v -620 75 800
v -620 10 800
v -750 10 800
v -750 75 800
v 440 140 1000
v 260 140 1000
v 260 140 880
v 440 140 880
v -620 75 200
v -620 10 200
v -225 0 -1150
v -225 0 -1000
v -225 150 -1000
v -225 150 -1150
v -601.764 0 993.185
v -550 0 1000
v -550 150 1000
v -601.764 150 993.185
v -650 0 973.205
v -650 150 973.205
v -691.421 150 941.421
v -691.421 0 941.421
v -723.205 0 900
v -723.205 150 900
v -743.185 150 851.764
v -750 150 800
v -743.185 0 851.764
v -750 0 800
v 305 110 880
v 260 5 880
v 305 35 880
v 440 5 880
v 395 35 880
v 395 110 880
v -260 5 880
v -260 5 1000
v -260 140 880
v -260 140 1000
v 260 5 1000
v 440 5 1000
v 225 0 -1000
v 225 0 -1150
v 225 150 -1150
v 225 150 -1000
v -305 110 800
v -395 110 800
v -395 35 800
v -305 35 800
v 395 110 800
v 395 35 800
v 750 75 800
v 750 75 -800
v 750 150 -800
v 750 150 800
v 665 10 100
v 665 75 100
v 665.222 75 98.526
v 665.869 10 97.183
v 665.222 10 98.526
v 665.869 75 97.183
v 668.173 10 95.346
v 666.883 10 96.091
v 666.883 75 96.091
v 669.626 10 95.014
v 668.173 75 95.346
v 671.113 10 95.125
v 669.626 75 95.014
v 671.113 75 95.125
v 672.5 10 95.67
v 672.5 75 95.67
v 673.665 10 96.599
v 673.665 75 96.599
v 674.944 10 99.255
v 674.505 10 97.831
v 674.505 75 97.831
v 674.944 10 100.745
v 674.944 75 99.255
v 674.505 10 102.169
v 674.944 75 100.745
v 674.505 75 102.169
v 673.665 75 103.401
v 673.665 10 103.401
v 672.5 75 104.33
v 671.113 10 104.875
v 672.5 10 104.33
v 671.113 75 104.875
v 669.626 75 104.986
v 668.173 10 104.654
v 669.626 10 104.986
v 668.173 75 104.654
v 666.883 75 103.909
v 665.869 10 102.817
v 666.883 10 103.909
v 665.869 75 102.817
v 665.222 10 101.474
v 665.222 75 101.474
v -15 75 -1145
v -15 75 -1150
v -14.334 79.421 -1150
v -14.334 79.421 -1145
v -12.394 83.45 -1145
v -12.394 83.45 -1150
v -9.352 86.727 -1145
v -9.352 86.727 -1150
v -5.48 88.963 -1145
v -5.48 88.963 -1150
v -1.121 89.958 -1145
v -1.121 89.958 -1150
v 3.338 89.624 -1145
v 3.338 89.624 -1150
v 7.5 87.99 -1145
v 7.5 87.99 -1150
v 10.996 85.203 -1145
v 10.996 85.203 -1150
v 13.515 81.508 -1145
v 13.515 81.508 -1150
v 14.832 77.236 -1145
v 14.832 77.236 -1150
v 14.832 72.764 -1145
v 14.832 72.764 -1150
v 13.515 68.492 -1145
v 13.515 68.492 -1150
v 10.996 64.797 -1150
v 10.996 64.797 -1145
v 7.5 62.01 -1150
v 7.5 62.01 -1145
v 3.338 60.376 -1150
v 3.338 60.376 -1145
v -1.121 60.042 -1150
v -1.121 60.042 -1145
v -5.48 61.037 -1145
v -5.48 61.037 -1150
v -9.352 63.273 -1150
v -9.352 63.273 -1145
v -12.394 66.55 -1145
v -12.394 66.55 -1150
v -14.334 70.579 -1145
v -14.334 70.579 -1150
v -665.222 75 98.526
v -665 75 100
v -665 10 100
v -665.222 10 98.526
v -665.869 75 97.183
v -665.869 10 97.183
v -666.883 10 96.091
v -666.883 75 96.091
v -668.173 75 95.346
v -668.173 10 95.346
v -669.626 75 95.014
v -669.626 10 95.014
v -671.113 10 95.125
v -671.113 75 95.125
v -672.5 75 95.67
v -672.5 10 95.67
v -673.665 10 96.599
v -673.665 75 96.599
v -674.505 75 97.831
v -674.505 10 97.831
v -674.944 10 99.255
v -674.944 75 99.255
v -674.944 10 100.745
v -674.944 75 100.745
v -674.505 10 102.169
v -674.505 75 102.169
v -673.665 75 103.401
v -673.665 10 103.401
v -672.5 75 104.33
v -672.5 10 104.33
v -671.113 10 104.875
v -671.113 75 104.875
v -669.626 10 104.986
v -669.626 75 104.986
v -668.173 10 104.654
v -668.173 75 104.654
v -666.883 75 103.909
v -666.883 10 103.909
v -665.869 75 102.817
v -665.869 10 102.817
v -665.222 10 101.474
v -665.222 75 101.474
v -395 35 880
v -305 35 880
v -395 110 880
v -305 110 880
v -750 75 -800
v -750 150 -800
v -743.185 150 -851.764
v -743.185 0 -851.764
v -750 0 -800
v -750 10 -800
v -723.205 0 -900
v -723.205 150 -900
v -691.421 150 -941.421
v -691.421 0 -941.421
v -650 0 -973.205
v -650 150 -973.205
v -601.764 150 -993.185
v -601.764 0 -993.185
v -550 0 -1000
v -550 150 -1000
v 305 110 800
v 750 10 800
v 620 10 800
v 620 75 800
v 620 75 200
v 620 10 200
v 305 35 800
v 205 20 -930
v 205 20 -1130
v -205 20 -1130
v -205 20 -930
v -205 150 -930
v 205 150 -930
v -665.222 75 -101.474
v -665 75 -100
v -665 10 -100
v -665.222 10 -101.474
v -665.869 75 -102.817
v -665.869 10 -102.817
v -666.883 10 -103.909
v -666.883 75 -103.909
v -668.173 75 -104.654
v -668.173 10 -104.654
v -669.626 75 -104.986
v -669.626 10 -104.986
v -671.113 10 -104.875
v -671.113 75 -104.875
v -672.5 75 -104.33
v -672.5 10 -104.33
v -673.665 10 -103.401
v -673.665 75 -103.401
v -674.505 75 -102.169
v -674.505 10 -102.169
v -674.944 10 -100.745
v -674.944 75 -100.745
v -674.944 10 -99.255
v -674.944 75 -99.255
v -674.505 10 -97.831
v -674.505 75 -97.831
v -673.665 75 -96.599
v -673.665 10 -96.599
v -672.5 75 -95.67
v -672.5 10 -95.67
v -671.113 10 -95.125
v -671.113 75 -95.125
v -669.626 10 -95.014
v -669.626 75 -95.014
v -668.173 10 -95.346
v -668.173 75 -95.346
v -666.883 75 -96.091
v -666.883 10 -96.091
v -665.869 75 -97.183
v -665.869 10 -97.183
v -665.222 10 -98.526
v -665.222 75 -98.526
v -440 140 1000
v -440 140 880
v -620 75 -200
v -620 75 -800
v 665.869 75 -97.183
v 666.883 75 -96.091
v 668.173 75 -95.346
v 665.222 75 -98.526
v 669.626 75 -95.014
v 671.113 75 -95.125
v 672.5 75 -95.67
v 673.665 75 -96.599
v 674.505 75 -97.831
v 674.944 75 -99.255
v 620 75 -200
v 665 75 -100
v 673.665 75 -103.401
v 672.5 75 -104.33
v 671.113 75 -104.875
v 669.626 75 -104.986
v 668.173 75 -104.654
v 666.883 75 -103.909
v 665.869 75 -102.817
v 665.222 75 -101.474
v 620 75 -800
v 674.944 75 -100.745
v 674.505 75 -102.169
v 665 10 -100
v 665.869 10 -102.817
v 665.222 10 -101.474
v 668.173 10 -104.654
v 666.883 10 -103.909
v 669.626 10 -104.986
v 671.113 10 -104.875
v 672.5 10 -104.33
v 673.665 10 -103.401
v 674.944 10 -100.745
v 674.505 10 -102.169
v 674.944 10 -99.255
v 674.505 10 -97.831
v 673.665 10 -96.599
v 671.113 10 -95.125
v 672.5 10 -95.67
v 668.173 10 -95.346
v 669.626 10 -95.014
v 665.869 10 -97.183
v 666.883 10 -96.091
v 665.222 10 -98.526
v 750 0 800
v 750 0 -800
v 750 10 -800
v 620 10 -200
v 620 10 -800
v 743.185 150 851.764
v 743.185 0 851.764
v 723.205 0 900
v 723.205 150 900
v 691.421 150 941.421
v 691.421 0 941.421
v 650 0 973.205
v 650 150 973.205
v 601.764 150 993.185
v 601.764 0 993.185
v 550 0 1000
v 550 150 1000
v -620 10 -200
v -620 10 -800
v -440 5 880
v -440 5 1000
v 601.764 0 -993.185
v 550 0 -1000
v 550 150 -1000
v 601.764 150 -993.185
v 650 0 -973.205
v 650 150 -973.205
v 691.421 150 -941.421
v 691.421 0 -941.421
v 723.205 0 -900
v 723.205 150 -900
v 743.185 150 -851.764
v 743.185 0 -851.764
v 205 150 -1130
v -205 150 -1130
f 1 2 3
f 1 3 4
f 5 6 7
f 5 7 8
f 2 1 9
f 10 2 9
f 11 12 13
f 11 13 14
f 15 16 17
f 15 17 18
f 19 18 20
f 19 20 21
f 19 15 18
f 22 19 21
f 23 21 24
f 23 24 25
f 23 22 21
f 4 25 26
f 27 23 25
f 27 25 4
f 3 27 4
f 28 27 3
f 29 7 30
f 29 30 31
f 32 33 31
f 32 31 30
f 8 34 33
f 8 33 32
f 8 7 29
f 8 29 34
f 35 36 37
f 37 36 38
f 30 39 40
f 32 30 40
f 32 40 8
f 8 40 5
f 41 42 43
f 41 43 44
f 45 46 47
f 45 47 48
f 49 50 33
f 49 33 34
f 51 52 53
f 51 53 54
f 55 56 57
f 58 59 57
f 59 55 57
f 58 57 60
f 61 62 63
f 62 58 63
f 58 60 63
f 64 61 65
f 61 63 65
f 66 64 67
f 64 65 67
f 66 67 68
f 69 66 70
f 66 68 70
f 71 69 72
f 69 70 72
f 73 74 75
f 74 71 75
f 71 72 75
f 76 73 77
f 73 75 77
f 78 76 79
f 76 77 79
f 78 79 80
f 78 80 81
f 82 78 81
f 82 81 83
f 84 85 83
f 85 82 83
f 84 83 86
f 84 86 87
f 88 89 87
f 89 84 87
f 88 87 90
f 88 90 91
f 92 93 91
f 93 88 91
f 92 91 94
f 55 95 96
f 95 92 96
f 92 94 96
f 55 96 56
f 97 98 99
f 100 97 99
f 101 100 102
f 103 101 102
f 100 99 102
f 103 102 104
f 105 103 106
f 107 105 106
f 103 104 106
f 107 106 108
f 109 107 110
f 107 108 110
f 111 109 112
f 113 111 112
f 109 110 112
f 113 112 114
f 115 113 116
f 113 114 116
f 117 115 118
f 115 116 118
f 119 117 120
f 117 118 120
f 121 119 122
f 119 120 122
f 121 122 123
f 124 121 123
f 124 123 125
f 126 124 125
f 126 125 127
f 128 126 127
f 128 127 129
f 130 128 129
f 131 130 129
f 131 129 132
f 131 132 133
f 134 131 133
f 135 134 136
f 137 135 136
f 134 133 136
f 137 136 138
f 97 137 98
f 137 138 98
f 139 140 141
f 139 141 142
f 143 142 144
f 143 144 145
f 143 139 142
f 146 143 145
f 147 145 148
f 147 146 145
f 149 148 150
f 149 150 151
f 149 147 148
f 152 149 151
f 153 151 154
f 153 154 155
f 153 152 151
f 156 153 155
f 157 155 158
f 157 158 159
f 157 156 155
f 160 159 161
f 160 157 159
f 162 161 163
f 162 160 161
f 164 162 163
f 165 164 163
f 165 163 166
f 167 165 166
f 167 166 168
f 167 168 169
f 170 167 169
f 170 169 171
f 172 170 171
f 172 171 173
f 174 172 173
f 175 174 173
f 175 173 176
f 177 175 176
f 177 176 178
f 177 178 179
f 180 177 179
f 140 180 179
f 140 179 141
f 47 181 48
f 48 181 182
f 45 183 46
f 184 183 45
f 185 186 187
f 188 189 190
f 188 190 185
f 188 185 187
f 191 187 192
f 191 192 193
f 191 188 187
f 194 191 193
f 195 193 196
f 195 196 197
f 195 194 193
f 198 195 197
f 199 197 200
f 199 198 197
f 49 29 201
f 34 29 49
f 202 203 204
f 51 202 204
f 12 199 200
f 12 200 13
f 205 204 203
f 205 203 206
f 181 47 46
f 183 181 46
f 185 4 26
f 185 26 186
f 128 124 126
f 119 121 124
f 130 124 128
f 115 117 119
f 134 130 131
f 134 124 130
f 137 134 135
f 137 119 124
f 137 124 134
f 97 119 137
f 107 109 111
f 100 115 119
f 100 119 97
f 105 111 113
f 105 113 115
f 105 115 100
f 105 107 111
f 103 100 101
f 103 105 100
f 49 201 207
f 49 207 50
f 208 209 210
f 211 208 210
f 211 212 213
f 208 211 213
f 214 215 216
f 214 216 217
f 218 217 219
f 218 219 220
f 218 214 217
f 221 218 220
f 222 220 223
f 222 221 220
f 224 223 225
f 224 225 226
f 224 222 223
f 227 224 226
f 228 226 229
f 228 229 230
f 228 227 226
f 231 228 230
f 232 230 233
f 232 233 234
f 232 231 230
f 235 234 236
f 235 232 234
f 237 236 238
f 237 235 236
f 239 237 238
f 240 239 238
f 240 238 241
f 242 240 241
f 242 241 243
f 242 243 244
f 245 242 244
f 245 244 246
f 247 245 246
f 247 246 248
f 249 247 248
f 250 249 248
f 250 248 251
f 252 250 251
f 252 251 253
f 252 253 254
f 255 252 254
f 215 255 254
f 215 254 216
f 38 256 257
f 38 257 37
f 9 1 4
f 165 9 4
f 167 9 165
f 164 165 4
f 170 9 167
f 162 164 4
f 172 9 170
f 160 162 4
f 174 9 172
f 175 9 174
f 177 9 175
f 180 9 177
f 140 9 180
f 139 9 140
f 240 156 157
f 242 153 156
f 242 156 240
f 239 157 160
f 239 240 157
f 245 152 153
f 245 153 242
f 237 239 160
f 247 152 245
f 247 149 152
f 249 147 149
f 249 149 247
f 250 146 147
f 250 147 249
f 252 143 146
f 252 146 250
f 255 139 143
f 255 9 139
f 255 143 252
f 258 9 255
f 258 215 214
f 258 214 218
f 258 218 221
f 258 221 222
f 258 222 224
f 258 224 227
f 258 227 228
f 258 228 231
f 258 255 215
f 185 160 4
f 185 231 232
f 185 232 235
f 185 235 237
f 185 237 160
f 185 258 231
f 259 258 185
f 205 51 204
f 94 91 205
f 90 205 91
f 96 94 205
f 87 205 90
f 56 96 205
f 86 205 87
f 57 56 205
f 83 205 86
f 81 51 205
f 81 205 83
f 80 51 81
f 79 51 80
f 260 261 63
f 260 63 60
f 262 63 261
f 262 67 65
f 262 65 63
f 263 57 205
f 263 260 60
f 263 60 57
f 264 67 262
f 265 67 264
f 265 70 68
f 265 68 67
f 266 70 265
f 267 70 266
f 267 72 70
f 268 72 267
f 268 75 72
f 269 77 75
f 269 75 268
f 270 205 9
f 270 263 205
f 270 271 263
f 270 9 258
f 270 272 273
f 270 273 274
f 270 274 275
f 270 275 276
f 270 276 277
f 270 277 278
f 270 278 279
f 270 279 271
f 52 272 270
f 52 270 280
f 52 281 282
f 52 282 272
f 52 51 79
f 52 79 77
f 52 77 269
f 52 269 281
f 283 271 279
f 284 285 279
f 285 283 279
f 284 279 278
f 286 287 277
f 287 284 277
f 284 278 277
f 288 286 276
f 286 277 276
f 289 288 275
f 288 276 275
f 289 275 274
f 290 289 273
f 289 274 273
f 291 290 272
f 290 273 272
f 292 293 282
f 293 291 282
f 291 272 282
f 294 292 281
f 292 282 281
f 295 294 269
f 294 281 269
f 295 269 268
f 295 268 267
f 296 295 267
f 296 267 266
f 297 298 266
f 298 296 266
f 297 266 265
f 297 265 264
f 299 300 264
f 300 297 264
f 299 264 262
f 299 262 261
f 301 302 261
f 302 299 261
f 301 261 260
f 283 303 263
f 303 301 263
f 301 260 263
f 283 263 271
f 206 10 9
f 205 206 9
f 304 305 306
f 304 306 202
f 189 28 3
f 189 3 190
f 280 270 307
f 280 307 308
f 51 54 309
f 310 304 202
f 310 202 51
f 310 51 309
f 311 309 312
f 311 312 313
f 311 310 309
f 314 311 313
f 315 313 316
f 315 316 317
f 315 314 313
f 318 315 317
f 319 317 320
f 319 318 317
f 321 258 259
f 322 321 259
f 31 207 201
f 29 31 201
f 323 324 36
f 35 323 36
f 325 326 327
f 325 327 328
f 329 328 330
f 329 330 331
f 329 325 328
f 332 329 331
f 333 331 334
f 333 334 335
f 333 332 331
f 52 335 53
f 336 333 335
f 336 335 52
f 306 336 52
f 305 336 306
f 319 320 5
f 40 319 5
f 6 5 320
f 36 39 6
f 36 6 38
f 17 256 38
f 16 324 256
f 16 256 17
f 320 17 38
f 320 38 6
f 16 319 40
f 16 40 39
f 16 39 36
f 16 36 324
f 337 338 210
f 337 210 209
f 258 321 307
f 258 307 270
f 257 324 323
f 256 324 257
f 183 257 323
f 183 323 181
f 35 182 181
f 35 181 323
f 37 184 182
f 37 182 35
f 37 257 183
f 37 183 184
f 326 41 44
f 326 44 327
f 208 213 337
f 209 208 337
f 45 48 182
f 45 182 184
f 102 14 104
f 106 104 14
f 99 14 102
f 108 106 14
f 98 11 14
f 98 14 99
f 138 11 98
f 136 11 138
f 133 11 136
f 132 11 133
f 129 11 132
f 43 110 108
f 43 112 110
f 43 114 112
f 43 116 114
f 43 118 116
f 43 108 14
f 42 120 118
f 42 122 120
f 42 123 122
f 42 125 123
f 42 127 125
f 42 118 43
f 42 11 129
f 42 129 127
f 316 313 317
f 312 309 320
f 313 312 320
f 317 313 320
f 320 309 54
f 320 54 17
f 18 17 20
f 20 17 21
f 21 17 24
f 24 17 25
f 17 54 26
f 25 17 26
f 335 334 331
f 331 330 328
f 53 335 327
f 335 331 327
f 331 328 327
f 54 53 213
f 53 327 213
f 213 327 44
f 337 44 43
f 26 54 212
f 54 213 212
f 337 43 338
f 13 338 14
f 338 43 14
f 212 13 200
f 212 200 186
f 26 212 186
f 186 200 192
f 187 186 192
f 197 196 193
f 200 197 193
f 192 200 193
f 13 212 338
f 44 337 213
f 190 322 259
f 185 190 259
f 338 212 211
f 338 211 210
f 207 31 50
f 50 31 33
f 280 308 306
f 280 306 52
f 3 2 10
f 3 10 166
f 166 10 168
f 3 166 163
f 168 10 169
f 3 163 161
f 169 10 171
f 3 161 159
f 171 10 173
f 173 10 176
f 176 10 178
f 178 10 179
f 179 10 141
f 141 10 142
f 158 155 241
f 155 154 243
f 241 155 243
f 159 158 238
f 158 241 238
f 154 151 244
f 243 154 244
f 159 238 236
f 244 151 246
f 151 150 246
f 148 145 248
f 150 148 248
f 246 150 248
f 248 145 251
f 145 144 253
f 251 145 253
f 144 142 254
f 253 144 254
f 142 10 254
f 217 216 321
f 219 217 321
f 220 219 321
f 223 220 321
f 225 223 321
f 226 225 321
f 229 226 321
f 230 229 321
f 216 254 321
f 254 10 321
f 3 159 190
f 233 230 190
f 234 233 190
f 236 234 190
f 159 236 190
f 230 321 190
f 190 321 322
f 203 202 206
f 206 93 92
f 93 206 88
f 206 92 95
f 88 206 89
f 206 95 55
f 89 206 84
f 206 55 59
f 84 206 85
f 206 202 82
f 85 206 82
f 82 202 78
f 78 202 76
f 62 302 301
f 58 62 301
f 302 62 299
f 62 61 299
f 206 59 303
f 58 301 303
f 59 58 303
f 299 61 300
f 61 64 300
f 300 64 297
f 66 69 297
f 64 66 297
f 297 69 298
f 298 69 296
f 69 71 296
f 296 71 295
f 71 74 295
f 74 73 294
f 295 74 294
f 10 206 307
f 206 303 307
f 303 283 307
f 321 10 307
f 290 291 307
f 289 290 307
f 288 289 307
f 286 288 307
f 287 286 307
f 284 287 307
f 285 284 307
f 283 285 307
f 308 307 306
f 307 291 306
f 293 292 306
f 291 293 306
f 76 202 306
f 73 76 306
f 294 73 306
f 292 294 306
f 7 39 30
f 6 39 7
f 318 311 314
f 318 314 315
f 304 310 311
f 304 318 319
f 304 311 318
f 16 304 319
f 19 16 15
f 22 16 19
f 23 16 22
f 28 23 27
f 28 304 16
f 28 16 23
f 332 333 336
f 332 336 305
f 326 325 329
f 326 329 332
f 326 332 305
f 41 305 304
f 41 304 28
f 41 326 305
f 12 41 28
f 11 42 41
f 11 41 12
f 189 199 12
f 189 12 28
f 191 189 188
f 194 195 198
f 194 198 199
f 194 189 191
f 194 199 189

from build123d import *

# Parameters (mm, degrees)
BOSS_EXTRUDE1_DEPTH     = 150
SKETCH2_W               = 400
SKETCH2_H               = 65
CUT_EXTRUDE1_DEPTH      = 1
CUT_EXTRUDE1_DEPTH_BACK = 1501
SKETCH3_W               = 600
SKETCH3_H               = 65
CUT_EXTRUDE2_DEPTH      = 130
SKETCH4_R               = 5
BOSS_EXTRUDE2_DEPTH     = 150
SKETCH5_W               = 90
SKETCH5_H               = 75
CUT_EXTRUDE3_DEPTH      = 200
SKETCH6_R               = 15
CUT_EXTRUDE4_DEPTH      = 5
SKETCH7_W               = 180
SKETCH7_H               = 135
CUT_EXTRUDE5_DEPTH      = 120
CUT_EXTRUDE6_START      = -20
SKETCH8_W               = 410
SKETCH8_H               = 110
SKETCH8_R               = 15
CUT_EXTRUDE6_DEPTH      = 200
SKETCH9_W               = 410
SKETCH9_H               = 200
CUT_EXTRUDE7_DEPTH      = 127


with BuildPart() as part:
    # Sketch1 → Boss-Extrude1 (new body)
    with BuildSketch(Plane(origin=(0, 0, 0), x_dir=(1, 0, 0), z_dir=(0, 1, 0))):
        with BuildLine():
            Line((-225, 1000), (-225, 1150))
            Line((-225, 1150), (225, 1150))
            Line((225, 1150), (225, 1000))
            Line((225, 1000), (550, 1000))
            ThreePointArc((550, 1000), (691.421356237, 941.421356237), (750, 800))
            Line((750, 800), (750, -800))
            ThreePointArc((750, -800), (691.421356237, -941.421356237), (550, -1000))
            Line((550, -1000), (-550, -1000))
            ThreePointArc((-550, -1000), (-691.421356237, -941.421356237), (-750, -800))
            Line((-750, -800), (-750, 800))
            ThreePointArc((-750, 800), (-691.421356237, 941.421356237), (-550, 1000))
            Line((-550, 1000), (-225, 1000))
        make_face()
    extrude(amount=BOSS_EXTRUDE1_DEPTH)

    # Sketch2 → Cut-Extrude1 (cut, two sides)
    with BuildSketch(Plane(origin=(750, 0, 0), x_dir=(0, 0, -1), z_dir=(1, 0, 0))) as cut_extrude1_sk:
        with Locations((0, 42.5)):
            Rectangle(SKETCH2_W, SKETCH2_H)
    extrude(amount=CUT_EXTRUDE1_DEPTH, mode=Mode.SUBTRACT)
    extrude(cut_extrude1_sk.sketch, amount=-CUT_EXTRUDE1_DEPTH_BACK, mode=Mode.SUBTRACT)

    # Sketch3 → Cut-Extrude2 (cut)
    with BuildSketch(Plane(origin=(750, 0, 0), x_dir=(0, 0, -1), z_dir=(1, 0, 0))):
        with Locations((500, 42.5)):
            Rectangle(SKETCH3_W, SKETCH3_H)
        with Locations((-500, 42.5)):
            Rectangle(SKETCH3_W, SKETCH3_H)
    cut_extrude2 = extrude(amount=-CUT_EXTRUDE2_DEPTH, mode=Mode.SUBTRACT)

    # Mirror1: Cut-Extrude2 across plane
    add(cut_extrude2.mirror(Plane(origin=(0, 0, 0), x_dir=(0, 0, 1), z_dir=(1, 0, 0))), mode=Mode.SUBTRACT)

    # Sketch4 → Boss-Extrude2 (add)
    with BuildSketch(Plane(origin=(0, 150, 0), x_dir=(1, 0, 0), z_dir=(0, 1, 0))):
        with Locations((-670, 100)):
            Circle(SKETCH4_R)
        with Locations((-670, -100)):
            Circle(SKETCH4_R)
    boss_extrude2 = extrude(amount=-BOSS_EXTRUDE2_DEPTH)

    # Mirror2: Boss-Extrude2 across plane
    add(boss_extrude2.mirror(Plane(origin=(0, 0, 0), x_dir=(0, 0, 1), z_dir=(1, 0, 0))))

    # Sketch5 → Cut-Extrude3 (cut)
    with BuildSketch(Plane.XY.offset(1000)):
        with Locations((-350, 72.5)):
            Rectangle(SKETCH5_W, SKETCH5_H)
        with Locations((350, 72.5)):
            Rectangle(SKETCH5_W, SKETCH5_H)
    extrude(amount=-CUT_EXTRUDE3_DEPTH, mode=Mode.SUBTRACT)

    # Sketch6 → Cut-Extrude4 (cut)
    with BuildSketch(Plane(origin=(0, 0, -1150), x_dir=(-1, 0, 0), z_dir=(0, 0, -1))):
        with Locations((0, 75)):
            Circle(SKETCH6_R)
    extrude(amount=-CUT_EXTRUDE4_DEPTH, mode=Mode.SUBTRACT)

    # Sketch7 → Cut-Extrude5 (cut)
    with BuildSketch(Plane.XY.offset(1000)):
        with Locations((-350, 72.5)):
            Rectangle(SKETCH7_W, SKETCH7_H)
        with Locations((350, 72.5)):
            Rectangle(SKETCH7_W, SKETCH7_H)
    extrude(amount=-CUT_EXTRUDE5_DEPTH, mode=Mode.SUBTRACT)

    # Sketch8 → Cut-Extrude6 (cut)
    with BuildSketch(Plane(origin=(0, 0, -1150), x_dir=(-1, 0, 0), z_dir=(0, 0, -1)).offset(CUT_EXTRUDE6_START)):
        with Locations((0, 75)):
            Rectangle(SKETCH8_W, SKETCH8_H)
        with Locations((0, 75)):
            Circle(SKETCH8_R, mode=Mode.SUBTRACT)
    extrude(amount=-CUT_EXTRUDE6_DEPTH, mode=Mode.SUBTRACT)

    # Sketch9 → Cut-Extrude7 (cut)
    with BuildSketch(Plane(origin=(0, 150, 0), x_dir=(1, 0, 0), z_dir=(0, 1, 0))):
        with Locations((0, 1030)):
            Rectangle(SKETCH9_W, SKETCH9_H)
    extrude(amount=-CUT_EXTRUDE7_DEPTH, mode=Mode.SUBTRACT)


solid = part.part
